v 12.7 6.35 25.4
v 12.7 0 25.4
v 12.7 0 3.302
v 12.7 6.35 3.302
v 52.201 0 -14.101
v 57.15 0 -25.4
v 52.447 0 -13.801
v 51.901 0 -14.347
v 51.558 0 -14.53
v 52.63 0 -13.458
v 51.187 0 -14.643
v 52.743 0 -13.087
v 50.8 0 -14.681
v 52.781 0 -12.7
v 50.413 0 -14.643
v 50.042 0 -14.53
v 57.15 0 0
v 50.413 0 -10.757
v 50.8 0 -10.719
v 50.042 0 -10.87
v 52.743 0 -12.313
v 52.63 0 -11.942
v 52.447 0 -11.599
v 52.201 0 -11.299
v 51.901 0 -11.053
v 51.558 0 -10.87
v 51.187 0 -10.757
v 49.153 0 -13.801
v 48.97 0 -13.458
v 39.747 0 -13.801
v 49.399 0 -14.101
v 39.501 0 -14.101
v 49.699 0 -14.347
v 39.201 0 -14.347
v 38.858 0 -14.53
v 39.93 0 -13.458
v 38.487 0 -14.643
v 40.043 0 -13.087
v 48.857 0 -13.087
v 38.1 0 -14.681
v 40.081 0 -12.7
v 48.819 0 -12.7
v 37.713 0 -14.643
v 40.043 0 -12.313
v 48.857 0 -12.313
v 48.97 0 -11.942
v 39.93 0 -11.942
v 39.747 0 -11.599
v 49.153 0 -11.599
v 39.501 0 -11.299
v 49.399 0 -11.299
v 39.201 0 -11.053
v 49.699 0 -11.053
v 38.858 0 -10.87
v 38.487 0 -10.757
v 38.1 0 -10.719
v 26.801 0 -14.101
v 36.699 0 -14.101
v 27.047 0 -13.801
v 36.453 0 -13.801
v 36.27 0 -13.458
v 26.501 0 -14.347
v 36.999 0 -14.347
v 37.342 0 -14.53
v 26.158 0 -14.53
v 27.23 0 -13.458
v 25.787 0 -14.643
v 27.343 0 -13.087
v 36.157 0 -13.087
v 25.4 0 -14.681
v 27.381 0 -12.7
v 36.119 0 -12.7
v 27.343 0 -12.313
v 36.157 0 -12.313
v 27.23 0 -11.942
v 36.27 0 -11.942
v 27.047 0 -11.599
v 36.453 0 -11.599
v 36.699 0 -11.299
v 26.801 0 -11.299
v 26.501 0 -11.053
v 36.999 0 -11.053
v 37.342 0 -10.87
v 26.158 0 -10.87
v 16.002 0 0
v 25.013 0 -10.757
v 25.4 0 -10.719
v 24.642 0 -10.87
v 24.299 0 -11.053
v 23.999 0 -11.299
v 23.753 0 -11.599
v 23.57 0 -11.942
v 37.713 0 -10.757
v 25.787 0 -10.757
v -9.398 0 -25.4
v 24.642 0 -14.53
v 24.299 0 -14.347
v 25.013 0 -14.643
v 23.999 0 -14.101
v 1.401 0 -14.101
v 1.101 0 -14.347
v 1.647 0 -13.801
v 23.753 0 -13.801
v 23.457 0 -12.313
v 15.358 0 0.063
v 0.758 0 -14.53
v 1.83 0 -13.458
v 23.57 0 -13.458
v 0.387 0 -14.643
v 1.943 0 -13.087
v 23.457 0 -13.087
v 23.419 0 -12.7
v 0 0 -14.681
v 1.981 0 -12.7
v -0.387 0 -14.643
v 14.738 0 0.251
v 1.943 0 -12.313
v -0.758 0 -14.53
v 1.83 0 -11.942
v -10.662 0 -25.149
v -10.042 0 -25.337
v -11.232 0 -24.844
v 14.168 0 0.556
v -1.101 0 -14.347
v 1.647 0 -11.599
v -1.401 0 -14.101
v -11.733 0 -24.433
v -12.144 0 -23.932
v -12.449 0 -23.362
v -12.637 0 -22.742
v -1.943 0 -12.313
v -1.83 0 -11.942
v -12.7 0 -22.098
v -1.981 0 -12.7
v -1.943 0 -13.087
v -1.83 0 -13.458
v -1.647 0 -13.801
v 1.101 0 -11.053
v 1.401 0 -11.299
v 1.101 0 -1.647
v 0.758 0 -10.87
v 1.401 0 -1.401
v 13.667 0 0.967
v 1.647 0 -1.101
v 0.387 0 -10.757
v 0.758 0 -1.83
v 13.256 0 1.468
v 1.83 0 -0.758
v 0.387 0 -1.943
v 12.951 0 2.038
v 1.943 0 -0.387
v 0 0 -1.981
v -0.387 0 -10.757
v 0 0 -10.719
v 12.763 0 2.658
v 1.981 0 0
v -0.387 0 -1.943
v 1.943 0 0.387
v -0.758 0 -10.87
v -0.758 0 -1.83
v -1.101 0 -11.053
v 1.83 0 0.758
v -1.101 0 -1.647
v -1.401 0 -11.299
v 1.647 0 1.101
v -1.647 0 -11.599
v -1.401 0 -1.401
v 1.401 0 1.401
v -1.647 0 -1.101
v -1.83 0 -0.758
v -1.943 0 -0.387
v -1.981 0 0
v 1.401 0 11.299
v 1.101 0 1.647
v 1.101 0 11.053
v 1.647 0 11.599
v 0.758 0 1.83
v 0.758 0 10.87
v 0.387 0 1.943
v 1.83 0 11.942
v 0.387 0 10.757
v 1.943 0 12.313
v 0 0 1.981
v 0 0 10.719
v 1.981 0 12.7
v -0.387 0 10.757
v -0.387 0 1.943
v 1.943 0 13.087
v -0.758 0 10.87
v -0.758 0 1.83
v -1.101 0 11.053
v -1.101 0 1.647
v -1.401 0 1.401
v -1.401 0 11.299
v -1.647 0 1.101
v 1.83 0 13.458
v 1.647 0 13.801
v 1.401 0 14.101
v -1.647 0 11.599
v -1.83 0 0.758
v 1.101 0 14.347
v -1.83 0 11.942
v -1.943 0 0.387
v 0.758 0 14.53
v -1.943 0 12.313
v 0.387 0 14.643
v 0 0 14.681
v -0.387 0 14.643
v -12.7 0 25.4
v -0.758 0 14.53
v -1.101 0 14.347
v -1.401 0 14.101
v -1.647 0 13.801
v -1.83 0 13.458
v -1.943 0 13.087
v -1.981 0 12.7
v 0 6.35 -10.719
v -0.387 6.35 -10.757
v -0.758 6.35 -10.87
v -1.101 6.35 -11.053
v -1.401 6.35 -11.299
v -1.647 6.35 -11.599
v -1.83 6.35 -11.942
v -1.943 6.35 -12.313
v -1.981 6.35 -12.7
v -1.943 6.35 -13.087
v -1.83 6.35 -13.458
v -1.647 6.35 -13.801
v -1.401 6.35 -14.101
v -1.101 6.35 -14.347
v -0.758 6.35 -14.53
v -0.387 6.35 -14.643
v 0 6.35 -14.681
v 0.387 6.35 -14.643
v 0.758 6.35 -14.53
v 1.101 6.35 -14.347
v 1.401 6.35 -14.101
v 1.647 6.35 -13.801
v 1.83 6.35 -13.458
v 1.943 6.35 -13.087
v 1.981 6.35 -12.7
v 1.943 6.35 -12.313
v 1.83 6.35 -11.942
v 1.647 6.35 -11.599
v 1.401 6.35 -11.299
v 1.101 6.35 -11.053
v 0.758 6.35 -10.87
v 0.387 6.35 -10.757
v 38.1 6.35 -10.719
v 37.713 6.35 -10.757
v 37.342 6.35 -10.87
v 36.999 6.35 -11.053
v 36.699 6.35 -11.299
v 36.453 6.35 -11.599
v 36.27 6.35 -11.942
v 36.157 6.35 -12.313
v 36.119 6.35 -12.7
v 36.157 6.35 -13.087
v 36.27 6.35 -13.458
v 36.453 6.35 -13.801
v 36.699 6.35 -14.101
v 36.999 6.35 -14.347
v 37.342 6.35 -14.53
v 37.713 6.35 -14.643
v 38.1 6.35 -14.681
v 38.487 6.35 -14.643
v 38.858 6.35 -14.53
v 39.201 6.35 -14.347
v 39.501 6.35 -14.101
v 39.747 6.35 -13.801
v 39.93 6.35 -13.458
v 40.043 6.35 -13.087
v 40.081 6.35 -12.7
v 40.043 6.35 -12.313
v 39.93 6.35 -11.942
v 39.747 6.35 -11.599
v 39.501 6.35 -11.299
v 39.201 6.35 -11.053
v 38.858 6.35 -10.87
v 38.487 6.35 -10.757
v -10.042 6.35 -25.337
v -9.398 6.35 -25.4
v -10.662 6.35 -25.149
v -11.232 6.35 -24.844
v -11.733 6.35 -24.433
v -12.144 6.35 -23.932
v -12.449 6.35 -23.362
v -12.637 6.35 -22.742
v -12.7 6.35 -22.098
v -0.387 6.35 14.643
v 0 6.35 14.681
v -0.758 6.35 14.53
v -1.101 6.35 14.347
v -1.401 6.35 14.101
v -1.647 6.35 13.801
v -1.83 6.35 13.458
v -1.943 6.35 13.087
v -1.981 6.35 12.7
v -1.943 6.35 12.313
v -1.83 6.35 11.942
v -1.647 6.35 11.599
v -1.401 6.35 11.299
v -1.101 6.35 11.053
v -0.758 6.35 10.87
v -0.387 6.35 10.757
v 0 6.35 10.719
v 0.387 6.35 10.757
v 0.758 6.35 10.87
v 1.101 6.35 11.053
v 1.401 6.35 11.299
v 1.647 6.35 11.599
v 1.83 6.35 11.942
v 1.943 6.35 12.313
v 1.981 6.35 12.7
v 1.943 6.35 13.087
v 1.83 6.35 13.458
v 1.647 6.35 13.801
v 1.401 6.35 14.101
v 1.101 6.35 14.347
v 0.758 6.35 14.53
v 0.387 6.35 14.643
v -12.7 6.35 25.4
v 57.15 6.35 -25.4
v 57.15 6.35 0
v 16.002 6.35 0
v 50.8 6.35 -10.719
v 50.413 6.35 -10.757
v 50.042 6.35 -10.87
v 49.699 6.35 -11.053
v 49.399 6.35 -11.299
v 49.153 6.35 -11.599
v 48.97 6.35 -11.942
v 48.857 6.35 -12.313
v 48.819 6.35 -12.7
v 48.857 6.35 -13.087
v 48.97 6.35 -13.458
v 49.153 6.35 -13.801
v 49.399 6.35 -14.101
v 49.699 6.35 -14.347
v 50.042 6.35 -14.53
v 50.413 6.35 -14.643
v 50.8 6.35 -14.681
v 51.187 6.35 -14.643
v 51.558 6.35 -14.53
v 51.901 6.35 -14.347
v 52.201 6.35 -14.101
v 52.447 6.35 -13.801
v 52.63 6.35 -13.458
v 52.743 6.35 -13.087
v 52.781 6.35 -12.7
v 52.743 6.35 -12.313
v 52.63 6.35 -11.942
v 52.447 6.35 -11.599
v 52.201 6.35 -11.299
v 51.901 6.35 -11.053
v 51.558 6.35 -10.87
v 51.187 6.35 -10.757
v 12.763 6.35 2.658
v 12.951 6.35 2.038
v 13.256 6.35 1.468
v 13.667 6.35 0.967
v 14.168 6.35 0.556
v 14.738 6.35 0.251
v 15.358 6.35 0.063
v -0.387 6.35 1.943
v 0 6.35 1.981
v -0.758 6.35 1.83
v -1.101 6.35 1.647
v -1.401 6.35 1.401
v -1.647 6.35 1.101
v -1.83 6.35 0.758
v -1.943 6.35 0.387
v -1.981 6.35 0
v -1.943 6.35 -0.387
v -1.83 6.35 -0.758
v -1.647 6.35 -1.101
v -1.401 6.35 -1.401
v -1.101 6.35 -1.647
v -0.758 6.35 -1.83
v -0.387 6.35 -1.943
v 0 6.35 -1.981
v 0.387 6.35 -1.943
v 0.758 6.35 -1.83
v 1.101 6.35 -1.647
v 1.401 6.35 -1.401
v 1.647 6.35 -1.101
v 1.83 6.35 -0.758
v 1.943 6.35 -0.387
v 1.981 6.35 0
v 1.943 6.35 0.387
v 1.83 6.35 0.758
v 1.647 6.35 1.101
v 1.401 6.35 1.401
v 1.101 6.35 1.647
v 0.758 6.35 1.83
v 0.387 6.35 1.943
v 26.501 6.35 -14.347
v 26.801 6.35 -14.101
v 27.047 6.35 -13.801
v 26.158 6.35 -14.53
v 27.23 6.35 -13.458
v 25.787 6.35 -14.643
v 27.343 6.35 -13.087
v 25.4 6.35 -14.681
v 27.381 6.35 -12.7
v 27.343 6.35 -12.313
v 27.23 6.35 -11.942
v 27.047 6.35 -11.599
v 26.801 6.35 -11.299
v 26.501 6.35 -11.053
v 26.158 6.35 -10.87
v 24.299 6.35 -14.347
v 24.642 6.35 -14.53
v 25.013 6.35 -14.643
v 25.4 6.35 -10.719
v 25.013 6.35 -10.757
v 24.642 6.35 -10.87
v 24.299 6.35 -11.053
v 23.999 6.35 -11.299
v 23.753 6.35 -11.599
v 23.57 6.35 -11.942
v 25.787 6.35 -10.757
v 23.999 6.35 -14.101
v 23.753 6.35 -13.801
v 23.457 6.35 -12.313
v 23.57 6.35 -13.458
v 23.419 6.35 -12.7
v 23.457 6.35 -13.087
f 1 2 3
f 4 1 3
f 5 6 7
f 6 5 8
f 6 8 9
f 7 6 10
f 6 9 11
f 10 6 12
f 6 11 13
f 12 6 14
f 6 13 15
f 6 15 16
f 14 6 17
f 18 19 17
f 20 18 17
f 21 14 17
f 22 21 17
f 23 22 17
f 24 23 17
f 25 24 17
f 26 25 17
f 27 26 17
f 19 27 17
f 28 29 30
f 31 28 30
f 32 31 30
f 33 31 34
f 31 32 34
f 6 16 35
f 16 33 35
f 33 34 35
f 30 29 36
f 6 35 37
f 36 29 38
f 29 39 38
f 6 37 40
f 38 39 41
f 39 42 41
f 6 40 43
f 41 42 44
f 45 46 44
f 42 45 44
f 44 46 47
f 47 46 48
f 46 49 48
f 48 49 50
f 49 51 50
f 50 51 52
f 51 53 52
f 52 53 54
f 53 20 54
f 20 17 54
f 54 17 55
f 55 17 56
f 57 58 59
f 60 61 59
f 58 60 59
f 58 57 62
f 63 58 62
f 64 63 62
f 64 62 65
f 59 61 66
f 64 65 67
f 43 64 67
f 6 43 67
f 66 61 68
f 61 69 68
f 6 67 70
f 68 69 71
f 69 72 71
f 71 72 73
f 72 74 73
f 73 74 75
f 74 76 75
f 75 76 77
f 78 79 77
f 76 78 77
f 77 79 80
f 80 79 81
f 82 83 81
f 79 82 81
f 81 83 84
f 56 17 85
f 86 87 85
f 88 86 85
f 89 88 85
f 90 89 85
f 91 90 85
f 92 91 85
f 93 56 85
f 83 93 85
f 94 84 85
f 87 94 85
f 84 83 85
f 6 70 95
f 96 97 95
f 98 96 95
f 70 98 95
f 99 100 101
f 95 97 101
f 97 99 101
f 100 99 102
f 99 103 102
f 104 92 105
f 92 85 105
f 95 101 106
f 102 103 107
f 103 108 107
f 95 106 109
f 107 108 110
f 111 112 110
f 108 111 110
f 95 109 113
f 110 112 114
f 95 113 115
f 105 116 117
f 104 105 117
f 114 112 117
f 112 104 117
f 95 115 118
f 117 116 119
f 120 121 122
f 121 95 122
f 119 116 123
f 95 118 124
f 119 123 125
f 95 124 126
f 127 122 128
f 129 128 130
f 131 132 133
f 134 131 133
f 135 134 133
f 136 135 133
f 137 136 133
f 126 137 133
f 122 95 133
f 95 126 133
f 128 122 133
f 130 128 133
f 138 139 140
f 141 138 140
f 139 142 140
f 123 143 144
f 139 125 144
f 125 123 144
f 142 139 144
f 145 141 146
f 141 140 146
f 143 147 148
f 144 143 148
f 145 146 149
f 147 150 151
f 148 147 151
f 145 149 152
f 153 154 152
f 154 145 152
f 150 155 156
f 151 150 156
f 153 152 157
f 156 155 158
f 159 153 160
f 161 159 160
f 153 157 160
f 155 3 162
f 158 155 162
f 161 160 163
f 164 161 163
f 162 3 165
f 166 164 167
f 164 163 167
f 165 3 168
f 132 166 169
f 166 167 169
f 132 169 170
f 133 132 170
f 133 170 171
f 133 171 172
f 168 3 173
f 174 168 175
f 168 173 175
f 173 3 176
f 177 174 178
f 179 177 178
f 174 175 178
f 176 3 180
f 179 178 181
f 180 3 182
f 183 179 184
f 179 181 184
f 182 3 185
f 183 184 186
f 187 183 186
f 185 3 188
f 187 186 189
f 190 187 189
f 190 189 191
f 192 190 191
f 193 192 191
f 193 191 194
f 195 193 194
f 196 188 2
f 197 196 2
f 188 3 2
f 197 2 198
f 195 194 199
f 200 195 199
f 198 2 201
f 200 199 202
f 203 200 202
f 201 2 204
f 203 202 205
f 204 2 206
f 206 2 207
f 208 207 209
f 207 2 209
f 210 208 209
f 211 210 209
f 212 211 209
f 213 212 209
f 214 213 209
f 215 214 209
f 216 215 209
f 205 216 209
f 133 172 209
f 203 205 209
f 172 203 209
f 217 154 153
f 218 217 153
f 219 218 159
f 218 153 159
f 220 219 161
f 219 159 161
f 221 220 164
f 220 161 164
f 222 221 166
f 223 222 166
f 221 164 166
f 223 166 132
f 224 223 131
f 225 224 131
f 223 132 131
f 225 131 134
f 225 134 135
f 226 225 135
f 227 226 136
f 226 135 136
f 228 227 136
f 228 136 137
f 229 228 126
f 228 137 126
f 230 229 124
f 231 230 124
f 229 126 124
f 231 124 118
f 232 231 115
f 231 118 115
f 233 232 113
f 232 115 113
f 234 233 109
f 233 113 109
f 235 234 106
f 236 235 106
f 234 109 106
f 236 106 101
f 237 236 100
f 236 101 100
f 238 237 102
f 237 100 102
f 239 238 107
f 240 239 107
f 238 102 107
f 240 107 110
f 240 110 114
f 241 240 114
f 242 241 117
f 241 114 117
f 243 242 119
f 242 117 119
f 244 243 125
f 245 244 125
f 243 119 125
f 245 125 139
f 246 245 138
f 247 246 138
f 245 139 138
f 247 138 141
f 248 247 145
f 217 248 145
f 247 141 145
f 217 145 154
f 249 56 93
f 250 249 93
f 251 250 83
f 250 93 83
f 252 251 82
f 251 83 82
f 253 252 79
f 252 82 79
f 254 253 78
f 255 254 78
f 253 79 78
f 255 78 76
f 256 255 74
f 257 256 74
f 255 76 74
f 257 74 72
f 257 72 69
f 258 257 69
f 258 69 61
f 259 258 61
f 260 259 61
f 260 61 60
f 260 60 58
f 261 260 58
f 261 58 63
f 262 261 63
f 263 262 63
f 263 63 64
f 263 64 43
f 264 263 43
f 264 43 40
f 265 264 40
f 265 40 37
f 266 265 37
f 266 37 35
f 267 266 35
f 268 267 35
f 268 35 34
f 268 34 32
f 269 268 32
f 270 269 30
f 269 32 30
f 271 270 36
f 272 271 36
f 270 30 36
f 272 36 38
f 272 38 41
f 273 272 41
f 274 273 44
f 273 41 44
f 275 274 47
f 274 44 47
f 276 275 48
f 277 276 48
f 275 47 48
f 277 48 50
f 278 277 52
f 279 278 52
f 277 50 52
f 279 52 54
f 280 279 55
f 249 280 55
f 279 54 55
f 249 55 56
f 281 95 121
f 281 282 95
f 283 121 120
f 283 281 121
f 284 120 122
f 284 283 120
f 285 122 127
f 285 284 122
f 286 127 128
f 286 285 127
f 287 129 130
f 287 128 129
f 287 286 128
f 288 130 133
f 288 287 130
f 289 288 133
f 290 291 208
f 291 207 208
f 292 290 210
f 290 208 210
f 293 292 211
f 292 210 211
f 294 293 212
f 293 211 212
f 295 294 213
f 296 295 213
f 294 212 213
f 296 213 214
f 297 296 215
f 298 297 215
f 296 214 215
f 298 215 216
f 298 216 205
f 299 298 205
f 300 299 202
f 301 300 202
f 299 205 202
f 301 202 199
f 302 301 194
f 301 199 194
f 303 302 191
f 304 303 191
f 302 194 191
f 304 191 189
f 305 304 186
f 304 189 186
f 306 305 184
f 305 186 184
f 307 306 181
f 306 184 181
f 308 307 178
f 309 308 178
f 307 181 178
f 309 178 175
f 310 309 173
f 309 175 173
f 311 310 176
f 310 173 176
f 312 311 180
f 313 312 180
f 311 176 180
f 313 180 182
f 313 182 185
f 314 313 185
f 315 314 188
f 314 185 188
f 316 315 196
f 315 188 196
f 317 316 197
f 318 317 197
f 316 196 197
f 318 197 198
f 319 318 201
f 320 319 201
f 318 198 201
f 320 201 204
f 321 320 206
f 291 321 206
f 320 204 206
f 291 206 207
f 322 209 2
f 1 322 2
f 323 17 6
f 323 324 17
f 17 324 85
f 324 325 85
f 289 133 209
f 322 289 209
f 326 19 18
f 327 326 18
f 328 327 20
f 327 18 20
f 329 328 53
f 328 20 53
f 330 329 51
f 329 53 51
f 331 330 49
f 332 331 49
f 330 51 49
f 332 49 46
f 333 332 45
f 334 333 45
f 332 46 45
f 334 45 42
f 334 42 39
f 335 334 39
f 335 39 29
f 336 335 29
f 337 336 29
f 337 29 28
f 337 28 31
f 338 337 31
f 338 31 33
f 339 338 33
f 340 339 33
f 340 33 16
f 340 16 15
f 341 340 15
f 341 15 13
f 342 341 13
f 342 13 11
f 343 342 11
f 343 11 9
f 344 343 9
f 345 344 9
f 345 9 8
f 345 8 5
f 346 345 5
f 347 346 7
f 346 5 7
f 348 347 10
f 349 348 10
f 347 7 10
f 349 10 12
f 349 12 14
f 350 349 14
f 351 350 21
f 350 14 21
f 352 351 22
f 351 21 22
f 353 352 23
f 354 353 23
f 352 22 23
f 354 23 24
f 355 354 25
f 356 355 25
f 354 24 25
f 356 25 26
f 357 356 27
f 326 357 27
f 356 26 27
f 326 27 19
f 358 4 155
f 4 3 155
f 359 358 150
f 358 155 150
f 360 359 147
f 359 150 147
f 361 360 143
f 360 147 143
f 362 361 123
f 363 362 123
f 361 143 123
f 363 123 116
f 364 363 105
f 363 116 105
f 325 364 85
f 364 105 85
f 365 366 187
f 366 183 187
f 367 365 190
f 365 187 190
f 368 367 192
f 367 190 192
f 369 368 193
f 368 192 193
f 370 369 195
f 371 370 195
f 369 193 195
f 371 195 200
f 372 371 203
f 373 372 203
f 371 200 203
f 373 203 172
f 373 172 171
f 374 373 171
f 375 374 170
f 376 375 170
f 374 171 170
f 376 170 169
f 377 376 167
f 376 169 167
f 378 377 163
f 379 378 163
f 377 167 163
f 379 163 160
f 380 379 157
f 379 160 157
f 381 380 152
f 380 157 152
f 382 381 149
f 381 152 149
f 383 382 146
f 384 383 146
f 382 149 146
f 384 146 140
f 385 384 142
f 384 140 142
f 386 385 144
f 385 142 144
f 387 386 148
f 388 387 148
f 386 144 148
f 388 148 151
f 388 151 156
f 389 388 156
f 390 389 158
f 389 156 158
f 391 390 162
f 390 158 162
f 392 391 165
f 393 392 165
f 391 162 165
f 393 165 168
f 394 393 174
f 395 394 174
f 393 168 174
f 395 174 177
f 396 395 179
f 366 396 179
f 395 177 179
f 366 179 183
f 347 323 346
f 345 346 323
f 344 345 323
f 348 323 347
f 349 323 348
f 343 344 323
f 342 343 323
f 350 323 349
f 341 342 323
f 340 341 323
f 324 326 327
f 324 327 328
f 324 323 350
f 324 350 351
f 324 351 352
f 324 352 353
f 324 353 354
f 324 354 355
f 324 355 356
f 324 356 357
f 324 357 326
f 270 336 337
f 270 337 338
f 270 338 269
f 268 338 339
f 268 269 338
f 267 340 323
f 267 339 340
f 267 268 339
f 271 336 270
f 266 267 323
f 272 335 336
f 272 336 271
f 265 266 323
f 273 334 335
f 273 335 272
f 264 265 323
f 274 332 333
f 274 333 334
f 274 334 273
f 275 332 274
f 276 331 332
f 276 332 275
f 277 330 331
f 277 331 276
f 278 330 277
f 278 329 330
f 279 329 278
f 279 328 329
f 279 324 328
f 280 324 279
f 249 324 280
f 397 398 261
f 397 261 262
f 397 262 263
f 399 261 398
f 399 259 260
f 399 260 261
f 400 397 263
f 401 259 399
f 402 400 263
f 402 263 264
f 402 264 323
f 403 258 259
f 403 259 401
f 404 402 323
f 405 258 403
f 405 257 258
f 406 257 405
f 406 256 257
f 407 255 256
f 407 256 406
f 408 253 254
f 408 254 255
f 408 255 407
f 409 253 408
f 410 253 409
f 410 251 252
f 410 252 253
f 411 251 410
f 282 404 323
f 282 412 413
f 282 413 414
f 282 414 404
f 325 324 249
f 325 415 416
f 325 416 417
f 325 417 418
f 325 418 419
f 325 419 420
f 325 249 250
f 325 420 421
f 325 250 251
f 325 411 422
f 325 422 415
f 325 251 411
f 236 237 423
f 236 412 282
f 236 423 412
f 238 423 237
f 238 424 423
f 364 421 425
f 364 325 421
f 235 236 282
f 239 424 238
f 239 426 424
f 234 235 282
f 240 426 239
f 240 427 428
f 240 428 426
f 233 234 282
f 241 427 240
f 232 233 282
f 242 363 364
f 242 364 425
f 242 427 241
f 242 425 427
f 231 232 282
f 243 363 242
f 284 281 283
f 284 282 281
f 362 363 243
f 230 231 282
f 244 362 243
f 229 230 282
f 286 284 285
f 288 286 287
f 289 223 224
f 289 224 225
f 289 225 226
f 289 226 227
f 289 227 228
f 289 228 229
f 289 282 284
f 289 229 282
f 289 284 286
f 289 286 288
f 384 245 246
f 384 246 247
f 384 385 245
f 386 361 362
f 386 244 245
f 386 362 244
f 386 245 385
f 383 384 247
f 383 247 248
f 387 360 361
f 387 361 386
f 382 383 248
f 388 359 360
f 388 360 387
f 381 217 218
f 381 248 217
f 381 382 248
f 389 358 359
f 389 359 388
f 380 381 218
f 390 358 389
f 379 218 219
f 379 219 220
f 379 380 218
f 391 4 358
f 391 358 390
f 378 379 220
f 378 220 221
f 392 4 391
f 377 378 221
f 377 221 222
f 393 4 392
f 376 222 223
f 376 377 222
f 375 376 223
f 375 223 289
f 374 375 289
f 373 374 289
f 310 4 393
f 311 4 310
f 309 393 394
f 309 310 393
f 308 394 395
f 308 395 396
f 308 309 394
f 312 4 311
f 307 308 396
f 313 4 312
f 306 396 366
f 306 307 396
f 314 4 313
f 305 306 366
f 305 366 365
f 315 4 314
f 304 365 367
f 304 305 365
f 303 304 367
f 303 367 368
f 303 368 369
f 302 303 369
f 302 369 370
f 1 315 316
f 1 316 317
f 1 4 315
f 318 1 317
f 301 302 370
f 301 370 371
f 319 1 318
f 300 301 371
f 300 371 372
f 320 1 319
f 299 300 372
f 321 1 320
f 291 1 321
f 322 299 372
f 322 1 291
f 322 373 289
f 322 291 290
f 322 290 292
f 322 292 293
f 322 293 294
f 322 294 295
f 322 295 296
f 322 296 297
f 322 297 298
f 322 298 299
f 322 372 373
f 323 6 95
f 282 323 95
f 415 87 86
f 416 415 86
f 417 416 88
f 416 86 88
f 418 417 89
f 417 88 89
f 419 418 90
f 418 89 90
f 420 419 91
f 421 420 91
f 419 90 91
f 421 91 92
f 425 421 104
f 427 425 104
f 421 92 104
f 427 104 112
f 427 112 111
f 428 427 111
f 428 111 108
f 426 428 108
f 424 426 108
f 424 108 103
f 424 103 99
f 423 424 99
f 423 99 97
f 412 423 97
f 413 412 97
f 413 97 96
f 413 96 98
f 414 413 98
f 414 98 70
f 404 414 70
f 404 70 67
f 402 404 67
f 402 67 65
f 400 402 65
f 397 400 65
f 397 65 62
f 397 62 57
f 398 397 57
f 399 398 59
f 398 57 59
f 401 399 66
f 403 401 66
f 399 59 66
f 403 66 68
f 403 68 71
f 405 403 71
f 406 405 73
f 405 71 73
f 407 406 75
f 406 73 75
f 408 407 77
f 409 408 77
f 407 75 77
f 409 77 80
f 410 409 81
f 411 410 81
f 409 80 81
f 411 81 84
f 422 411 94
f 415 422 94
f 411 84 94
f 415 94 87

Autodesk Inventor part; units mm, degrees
ref_plane "YZ Plane" through (0, 0, 0) normal (1, 0, 0) x (0, 1, 0)
ref_plane "XZ Plane" through (0, 0, 0) normal (0, 1, 0) x (-1, 0, 0)
ref_plane "XY Plane" through (0, 0, 0) normal (0, 0, 1) x (1, 0, 0)
sketch "Sketch1" plane through (0, 0, 0) normal (0, 1, 0) x (-1, 0, 0)
  line L0 (12.7, 25.4) -> (-12.7, 25.4)
  line L1 (-12.7, 25.4) -> (-12.7, -25.4)
  line L2 (-12.7, -25.4) -> (12.7, -25.4)
  line L3 (12.7, -25.4) -> (12.7, 25.4)
  line L4 (12.7, 25.4) -> (-12.7, -25.4) construction
  line L5 (-12.7, 25.4) -> (12.7, -25.4) construction
  point P0 (0, 0)
  dimension "d0" = 25.4
  dimension "d1" = 50.8
extrude "Extrusion1" add sketch "Sketch1" along normal blind 6.35
sketch "Sketch3" plane through (12.7, 0, 25.4) normal (1, 0, 0) x (0, 0, -1)
  line L0 (0, 6.35) -> (50.8, 6.35) projected
  line L1 (50.8, 6.35) -> (25.4, 6.35)
  line L2 (25.4, 6.35) -> (25.4, 0)
  line L3 (25.4, 0) -> (50.8, 0)
  line L4 (50.8, 0) -> (50.8, 6.35)
  dimension "d14" = 25.4
extrude "Extrusion2" add sketch "Sketch3" along normal blind 44.45
sketch "Sketch4" plane through (0, 6.35, 0) normal (0, 1, 0) x (1, 0, 0)
  line L0 (-12.7, -25.4) -> (12.7, -25.4) projected
  point P0 (0, 0)
  point P1 (0, -12.7)
  point P2 (0, 0)
  point P3 (0, 12.7)
  point P4 (0, -25.4)
  point P5 (0, -25.4)
  point P6 (0, -25.4)
  point P7 (25.4, 12.7)
  point P8 (38.1, 12.7)
  point P9 (50.8, 12.7)
  dimension "d17" = 12.7
  dimension "d18" = 12.7
  dimension "d19" = 12.7
  dimension "d20" = 25.4
  dimension "d21" = 12.7
  dimension "d22" = 12.7
hole "Hole2" at (0, 6.35, 12.7) at (0, 6.35, 0) at (0, 6.35, -12.7) at (25.4, 6.35, -12.7) at (38.1, 6.35, -12.7) at (50.8, 6.35, -12.7) direction (0, -1, 0) diameter 3.9624 end through all thread size "10-32 UNF" class "2B" standard "ANSI Unified Screw Threads"
fillet "Fillet1" radius 3.302 2 edges at (12.7, 3.175, 0) (-12.7, 3.175, -25.4)
properties part number "DB1-004" material "Aluminum 6061"
